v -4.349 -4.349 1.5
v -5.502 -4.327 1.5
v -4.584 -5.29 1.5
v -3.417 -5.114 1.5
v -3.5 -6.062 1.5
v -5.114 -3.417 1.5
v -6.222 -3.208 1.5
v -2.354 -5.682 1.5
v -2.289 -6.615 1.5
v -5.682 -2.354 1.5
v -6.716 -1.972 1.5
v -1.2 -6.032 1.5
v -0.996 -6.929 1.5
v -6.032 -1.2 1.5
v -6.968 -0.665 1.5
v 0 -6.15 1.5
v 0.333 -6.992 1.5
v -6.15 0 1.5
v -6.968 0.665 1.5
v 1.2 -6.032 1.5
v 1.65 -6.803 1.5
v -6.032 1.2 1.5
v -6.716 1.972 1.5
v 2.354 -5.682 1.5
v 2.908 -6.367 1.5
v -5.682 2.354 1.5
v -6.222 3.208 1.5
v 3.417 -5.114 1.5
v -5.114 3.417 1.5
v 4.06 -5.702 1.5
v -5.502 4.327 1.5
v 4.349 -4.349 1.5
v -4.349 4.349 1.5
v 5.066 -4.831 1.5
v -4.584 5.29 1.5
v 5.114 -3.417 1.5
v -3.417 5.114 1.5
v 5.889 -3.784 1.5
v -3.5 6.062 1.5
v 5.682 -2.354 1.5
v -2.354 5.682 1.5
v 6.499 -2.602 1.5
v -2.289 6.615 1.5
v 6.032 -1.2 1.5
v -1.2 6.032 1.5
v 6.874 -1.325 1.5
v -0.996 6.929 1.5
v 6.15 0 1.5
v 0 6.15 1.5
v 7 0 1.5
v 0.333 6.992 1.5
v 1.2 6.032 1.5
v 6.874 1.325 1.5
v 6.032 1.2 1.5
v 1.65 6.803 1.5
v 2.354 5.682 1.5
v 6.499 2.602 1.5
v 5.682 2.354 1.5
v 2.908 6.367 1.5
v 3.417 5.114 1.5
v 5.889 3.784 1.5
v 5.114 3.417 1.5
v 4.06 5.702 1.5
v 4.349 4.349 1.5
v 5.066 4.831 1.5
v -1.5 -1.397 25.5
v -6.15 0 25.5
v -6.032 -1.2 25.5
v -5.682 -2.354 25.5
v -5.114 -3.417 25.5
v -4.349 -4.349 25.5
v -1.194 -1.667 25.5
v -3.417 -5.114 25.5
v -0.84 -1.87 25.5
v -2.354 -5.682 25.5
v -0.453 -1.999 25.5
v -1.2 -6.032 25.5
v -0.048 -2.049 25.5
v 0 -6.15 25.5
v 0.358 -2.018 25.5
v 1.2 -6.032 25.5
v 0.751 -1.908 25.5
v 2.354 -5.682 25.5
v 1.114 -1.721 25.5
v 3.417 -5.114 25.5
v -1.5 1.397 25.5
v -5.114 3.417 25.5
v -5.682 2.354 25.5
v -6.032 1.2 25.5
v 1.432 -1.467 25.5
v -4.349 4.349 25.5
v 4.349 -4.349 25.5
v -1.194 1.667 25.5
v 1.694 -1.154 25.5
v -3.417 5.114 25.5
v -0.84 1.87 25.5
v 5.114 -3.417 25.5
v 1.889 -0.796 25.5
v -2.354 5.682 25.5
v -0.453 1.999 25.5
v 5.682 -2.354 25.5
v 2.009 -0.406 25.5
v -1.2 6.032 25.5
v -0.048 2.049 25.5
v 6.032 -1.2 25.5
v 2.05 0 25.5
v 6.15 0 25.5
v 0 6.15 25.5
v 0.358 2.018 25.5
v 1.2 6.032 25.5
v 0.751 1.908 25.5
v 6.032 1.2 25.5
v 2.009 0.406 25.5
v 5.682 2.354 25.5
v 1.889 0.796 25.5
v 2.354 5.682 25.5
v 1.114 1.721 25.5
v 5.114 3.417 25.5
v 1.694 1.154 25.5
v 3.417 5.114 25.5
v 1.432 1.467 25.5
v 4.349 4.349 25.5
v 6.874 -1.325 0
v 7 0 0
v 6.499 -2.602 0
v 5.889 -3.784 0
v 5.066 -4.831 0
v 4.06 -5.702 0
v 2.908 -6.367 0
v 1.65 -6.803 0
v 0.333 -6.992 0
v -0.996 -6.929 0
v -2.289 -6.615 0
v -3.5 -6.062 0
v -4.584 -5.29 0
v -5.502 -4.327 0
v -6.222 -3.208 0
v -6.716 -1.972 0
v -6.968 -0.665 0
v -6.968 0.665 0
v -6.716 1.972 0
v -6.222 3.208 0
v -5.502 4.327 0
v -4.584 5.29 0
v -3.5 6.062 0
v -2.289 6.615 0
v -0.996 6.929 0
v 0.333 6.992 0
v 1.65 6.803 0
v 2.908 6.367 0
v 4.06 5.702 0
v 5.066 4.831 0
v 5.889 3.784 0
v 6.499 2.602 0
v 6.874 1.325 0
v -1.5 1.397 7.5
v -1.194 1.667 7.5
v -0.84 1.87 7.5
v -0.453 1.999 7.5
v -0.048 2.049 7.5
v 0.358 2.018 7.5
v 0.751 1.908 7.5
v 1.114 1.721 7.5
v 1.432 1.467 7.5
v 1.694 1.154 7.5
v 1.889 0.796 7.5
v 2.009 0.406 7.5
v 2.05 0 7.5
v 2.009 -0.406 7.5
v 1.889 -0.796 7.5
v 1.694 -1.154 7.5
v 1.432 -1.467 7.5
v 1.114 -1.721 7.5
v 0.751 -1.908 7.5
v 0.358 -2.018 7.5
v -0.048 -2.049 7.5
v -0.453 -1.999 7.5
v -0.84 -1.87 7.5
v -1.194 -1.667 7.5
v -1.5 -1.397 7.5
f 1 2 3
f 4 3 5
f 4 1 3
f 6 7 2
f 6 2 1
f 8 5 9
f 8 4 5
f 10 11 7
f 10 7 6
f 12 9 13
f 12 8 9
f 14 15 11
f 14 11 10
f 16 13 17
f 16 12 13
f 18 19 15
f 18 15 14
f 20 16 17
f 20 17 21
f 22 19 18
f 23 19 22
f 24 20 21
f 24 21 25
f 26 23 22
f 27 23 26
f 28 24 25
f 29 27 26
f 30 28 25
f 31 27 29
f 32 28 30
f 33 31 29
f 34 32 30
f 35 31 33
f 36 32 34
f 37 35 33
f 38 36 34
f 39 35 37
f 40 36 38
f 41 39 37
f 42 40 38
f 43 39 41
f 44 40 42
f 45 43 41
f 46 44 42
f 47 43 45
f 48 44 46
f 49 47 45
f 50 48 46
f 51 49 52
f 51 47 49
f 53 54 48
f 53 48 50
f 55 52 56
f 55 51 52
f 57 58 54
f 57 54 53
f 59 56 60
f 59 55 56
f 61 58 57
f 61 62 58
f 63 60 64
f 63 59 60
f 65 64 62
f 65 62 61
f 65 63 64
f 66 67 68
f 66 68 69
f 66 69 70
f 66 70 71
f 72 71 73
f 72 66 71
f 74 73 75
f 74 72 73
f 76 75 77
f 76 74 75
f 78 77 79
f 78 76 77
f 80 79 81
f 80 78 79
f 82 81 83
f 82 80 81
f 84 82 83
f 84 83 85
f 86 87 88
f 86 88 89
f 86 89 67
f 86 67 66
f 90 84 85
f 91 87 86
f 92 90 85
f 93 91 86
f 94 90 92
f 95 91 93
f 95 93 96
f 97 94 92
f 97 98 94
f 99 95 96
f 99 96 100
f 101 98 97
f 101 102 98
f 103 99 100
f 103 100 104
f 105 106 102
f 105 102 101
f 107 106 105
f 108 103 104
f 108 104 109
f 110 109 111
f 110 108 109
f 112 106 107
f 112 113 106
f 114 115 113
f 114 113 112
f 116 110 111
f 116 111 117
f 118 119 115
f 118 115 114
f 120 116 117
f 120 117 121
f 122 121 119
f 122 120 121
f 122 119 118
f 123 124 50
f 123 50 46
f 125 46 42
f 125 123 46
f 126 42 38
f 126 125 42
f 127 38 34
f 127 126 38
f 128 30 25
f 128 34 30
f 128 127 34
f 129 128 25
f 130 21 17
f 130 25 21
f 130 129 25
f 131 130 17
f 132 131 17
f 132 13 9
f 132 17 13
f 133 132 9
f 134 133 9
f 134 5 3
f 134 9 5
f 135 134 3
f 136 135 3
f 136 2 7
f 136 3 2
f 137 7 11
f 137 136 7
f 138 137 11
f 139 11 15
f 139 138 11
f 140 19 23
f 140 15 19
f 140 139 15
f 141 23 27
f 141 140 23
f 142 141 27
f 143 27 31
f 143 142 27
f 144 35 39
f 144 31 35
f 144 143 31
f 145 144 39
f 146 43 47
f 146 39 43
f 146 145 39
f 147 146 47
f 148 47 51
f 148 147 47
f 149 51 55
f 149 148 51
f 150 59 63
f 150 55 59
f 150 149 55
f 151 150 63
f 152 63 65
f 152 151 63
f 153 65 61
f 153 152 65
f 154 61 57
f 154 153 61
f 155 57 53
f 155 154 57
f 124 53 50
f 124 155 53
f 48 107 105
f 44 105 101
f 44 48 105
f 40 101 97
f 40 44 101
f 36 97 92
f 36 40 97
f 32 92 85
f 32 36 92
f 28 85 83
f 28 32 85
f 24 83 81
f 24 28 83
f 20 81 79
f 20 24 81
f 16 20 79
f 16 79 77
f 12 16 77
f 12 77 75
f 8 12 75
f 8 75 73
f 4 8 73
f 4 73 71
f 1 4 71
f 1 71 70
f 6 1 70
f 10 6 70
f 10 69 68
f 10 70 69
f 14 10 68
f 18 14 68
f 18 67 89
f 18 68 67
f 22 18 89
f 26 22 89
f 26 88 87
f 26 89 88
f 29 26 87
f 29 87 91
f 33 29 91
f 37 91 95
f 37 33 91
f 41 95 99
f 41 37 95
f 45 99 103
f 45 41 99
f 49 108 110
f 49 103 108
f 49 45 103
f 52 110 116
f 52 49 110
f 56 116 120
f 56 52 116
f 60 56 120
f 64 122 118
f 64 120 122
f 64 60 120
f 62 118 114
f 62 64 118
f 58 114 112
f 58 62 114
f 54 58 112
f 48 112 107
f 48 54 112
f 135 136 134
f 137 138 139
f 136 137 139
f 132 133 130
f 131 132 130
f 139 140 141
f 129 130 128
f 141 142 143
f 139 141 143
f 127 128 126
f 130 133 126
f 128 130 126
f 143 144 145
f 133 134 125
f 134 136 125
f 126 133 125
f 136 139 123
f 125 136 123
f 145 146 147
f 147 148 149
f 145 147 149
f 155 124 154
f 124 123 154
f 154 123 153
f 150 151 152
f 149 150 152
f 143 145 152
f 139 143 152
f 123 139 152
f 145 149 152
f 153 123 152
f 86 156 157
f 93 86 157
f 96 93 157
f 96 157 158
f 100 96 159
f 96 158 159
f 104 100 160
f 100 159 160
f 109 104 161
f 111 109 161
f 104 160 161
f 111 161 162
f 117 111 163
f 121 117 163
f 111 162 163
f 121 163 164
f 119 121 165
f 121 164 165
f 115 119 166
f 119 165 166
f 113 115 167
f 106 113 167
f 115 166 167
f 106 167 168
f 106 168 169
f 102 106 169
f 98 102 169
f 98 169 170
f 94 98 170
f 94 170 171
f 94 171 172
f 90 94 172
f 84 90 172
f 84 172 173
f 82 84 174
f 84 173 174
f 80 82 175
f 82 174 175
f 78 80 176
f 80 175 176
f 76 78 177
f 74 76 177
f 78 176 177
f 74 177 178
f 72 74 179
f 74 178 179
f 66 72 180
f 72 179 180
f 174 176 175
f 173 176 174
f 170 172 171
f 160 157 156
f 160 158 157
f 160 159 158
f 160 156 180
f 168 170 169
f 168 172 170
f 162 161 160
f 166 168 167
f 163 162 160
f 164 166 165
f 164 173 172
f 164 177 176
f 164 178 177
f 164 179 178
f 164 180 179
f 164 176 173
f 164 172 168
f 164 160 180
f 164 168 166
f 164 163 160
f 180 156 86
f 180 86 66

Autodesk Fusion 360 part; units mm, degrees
sketch "Sketch1" plane through (0, 0, 0) normal (0, 0, 1) x (1, 0, 0)
  circle A0 centre (0, 0) radius 7
  circle A1 centre (0, 0) radius 6.15
  circle A2 centre (0, 0) radius 2.05
  line L0 (-1.5, 0) -> (-1.5, -1.3973)
  line L1 (-1.5, 0) -> (-1.5, 1.3973)
  point P0 (-1.5, 0)
  dimension "d1" = 14
  dimension "d2" = 12.3
  dimension "d3" = 4.1
  dimension "d4" = 1.5
extrude "Extrude1" add sketch "Sketch1" along normal blind 1.5 contours A0 | A1 | A2 L0 L1 | A2 L0 L1
extrude "Extrude2" add sketch "Sketch1" along normal blind 25.5 contours A1 | A2 L0 L1 picked at (-1.859, 0.1021)
extrude "Extrude3" add sketch "Sketch1" along normal blind 7.5 contours A2 L0 L1 picked at (0.859, -0.1018)
